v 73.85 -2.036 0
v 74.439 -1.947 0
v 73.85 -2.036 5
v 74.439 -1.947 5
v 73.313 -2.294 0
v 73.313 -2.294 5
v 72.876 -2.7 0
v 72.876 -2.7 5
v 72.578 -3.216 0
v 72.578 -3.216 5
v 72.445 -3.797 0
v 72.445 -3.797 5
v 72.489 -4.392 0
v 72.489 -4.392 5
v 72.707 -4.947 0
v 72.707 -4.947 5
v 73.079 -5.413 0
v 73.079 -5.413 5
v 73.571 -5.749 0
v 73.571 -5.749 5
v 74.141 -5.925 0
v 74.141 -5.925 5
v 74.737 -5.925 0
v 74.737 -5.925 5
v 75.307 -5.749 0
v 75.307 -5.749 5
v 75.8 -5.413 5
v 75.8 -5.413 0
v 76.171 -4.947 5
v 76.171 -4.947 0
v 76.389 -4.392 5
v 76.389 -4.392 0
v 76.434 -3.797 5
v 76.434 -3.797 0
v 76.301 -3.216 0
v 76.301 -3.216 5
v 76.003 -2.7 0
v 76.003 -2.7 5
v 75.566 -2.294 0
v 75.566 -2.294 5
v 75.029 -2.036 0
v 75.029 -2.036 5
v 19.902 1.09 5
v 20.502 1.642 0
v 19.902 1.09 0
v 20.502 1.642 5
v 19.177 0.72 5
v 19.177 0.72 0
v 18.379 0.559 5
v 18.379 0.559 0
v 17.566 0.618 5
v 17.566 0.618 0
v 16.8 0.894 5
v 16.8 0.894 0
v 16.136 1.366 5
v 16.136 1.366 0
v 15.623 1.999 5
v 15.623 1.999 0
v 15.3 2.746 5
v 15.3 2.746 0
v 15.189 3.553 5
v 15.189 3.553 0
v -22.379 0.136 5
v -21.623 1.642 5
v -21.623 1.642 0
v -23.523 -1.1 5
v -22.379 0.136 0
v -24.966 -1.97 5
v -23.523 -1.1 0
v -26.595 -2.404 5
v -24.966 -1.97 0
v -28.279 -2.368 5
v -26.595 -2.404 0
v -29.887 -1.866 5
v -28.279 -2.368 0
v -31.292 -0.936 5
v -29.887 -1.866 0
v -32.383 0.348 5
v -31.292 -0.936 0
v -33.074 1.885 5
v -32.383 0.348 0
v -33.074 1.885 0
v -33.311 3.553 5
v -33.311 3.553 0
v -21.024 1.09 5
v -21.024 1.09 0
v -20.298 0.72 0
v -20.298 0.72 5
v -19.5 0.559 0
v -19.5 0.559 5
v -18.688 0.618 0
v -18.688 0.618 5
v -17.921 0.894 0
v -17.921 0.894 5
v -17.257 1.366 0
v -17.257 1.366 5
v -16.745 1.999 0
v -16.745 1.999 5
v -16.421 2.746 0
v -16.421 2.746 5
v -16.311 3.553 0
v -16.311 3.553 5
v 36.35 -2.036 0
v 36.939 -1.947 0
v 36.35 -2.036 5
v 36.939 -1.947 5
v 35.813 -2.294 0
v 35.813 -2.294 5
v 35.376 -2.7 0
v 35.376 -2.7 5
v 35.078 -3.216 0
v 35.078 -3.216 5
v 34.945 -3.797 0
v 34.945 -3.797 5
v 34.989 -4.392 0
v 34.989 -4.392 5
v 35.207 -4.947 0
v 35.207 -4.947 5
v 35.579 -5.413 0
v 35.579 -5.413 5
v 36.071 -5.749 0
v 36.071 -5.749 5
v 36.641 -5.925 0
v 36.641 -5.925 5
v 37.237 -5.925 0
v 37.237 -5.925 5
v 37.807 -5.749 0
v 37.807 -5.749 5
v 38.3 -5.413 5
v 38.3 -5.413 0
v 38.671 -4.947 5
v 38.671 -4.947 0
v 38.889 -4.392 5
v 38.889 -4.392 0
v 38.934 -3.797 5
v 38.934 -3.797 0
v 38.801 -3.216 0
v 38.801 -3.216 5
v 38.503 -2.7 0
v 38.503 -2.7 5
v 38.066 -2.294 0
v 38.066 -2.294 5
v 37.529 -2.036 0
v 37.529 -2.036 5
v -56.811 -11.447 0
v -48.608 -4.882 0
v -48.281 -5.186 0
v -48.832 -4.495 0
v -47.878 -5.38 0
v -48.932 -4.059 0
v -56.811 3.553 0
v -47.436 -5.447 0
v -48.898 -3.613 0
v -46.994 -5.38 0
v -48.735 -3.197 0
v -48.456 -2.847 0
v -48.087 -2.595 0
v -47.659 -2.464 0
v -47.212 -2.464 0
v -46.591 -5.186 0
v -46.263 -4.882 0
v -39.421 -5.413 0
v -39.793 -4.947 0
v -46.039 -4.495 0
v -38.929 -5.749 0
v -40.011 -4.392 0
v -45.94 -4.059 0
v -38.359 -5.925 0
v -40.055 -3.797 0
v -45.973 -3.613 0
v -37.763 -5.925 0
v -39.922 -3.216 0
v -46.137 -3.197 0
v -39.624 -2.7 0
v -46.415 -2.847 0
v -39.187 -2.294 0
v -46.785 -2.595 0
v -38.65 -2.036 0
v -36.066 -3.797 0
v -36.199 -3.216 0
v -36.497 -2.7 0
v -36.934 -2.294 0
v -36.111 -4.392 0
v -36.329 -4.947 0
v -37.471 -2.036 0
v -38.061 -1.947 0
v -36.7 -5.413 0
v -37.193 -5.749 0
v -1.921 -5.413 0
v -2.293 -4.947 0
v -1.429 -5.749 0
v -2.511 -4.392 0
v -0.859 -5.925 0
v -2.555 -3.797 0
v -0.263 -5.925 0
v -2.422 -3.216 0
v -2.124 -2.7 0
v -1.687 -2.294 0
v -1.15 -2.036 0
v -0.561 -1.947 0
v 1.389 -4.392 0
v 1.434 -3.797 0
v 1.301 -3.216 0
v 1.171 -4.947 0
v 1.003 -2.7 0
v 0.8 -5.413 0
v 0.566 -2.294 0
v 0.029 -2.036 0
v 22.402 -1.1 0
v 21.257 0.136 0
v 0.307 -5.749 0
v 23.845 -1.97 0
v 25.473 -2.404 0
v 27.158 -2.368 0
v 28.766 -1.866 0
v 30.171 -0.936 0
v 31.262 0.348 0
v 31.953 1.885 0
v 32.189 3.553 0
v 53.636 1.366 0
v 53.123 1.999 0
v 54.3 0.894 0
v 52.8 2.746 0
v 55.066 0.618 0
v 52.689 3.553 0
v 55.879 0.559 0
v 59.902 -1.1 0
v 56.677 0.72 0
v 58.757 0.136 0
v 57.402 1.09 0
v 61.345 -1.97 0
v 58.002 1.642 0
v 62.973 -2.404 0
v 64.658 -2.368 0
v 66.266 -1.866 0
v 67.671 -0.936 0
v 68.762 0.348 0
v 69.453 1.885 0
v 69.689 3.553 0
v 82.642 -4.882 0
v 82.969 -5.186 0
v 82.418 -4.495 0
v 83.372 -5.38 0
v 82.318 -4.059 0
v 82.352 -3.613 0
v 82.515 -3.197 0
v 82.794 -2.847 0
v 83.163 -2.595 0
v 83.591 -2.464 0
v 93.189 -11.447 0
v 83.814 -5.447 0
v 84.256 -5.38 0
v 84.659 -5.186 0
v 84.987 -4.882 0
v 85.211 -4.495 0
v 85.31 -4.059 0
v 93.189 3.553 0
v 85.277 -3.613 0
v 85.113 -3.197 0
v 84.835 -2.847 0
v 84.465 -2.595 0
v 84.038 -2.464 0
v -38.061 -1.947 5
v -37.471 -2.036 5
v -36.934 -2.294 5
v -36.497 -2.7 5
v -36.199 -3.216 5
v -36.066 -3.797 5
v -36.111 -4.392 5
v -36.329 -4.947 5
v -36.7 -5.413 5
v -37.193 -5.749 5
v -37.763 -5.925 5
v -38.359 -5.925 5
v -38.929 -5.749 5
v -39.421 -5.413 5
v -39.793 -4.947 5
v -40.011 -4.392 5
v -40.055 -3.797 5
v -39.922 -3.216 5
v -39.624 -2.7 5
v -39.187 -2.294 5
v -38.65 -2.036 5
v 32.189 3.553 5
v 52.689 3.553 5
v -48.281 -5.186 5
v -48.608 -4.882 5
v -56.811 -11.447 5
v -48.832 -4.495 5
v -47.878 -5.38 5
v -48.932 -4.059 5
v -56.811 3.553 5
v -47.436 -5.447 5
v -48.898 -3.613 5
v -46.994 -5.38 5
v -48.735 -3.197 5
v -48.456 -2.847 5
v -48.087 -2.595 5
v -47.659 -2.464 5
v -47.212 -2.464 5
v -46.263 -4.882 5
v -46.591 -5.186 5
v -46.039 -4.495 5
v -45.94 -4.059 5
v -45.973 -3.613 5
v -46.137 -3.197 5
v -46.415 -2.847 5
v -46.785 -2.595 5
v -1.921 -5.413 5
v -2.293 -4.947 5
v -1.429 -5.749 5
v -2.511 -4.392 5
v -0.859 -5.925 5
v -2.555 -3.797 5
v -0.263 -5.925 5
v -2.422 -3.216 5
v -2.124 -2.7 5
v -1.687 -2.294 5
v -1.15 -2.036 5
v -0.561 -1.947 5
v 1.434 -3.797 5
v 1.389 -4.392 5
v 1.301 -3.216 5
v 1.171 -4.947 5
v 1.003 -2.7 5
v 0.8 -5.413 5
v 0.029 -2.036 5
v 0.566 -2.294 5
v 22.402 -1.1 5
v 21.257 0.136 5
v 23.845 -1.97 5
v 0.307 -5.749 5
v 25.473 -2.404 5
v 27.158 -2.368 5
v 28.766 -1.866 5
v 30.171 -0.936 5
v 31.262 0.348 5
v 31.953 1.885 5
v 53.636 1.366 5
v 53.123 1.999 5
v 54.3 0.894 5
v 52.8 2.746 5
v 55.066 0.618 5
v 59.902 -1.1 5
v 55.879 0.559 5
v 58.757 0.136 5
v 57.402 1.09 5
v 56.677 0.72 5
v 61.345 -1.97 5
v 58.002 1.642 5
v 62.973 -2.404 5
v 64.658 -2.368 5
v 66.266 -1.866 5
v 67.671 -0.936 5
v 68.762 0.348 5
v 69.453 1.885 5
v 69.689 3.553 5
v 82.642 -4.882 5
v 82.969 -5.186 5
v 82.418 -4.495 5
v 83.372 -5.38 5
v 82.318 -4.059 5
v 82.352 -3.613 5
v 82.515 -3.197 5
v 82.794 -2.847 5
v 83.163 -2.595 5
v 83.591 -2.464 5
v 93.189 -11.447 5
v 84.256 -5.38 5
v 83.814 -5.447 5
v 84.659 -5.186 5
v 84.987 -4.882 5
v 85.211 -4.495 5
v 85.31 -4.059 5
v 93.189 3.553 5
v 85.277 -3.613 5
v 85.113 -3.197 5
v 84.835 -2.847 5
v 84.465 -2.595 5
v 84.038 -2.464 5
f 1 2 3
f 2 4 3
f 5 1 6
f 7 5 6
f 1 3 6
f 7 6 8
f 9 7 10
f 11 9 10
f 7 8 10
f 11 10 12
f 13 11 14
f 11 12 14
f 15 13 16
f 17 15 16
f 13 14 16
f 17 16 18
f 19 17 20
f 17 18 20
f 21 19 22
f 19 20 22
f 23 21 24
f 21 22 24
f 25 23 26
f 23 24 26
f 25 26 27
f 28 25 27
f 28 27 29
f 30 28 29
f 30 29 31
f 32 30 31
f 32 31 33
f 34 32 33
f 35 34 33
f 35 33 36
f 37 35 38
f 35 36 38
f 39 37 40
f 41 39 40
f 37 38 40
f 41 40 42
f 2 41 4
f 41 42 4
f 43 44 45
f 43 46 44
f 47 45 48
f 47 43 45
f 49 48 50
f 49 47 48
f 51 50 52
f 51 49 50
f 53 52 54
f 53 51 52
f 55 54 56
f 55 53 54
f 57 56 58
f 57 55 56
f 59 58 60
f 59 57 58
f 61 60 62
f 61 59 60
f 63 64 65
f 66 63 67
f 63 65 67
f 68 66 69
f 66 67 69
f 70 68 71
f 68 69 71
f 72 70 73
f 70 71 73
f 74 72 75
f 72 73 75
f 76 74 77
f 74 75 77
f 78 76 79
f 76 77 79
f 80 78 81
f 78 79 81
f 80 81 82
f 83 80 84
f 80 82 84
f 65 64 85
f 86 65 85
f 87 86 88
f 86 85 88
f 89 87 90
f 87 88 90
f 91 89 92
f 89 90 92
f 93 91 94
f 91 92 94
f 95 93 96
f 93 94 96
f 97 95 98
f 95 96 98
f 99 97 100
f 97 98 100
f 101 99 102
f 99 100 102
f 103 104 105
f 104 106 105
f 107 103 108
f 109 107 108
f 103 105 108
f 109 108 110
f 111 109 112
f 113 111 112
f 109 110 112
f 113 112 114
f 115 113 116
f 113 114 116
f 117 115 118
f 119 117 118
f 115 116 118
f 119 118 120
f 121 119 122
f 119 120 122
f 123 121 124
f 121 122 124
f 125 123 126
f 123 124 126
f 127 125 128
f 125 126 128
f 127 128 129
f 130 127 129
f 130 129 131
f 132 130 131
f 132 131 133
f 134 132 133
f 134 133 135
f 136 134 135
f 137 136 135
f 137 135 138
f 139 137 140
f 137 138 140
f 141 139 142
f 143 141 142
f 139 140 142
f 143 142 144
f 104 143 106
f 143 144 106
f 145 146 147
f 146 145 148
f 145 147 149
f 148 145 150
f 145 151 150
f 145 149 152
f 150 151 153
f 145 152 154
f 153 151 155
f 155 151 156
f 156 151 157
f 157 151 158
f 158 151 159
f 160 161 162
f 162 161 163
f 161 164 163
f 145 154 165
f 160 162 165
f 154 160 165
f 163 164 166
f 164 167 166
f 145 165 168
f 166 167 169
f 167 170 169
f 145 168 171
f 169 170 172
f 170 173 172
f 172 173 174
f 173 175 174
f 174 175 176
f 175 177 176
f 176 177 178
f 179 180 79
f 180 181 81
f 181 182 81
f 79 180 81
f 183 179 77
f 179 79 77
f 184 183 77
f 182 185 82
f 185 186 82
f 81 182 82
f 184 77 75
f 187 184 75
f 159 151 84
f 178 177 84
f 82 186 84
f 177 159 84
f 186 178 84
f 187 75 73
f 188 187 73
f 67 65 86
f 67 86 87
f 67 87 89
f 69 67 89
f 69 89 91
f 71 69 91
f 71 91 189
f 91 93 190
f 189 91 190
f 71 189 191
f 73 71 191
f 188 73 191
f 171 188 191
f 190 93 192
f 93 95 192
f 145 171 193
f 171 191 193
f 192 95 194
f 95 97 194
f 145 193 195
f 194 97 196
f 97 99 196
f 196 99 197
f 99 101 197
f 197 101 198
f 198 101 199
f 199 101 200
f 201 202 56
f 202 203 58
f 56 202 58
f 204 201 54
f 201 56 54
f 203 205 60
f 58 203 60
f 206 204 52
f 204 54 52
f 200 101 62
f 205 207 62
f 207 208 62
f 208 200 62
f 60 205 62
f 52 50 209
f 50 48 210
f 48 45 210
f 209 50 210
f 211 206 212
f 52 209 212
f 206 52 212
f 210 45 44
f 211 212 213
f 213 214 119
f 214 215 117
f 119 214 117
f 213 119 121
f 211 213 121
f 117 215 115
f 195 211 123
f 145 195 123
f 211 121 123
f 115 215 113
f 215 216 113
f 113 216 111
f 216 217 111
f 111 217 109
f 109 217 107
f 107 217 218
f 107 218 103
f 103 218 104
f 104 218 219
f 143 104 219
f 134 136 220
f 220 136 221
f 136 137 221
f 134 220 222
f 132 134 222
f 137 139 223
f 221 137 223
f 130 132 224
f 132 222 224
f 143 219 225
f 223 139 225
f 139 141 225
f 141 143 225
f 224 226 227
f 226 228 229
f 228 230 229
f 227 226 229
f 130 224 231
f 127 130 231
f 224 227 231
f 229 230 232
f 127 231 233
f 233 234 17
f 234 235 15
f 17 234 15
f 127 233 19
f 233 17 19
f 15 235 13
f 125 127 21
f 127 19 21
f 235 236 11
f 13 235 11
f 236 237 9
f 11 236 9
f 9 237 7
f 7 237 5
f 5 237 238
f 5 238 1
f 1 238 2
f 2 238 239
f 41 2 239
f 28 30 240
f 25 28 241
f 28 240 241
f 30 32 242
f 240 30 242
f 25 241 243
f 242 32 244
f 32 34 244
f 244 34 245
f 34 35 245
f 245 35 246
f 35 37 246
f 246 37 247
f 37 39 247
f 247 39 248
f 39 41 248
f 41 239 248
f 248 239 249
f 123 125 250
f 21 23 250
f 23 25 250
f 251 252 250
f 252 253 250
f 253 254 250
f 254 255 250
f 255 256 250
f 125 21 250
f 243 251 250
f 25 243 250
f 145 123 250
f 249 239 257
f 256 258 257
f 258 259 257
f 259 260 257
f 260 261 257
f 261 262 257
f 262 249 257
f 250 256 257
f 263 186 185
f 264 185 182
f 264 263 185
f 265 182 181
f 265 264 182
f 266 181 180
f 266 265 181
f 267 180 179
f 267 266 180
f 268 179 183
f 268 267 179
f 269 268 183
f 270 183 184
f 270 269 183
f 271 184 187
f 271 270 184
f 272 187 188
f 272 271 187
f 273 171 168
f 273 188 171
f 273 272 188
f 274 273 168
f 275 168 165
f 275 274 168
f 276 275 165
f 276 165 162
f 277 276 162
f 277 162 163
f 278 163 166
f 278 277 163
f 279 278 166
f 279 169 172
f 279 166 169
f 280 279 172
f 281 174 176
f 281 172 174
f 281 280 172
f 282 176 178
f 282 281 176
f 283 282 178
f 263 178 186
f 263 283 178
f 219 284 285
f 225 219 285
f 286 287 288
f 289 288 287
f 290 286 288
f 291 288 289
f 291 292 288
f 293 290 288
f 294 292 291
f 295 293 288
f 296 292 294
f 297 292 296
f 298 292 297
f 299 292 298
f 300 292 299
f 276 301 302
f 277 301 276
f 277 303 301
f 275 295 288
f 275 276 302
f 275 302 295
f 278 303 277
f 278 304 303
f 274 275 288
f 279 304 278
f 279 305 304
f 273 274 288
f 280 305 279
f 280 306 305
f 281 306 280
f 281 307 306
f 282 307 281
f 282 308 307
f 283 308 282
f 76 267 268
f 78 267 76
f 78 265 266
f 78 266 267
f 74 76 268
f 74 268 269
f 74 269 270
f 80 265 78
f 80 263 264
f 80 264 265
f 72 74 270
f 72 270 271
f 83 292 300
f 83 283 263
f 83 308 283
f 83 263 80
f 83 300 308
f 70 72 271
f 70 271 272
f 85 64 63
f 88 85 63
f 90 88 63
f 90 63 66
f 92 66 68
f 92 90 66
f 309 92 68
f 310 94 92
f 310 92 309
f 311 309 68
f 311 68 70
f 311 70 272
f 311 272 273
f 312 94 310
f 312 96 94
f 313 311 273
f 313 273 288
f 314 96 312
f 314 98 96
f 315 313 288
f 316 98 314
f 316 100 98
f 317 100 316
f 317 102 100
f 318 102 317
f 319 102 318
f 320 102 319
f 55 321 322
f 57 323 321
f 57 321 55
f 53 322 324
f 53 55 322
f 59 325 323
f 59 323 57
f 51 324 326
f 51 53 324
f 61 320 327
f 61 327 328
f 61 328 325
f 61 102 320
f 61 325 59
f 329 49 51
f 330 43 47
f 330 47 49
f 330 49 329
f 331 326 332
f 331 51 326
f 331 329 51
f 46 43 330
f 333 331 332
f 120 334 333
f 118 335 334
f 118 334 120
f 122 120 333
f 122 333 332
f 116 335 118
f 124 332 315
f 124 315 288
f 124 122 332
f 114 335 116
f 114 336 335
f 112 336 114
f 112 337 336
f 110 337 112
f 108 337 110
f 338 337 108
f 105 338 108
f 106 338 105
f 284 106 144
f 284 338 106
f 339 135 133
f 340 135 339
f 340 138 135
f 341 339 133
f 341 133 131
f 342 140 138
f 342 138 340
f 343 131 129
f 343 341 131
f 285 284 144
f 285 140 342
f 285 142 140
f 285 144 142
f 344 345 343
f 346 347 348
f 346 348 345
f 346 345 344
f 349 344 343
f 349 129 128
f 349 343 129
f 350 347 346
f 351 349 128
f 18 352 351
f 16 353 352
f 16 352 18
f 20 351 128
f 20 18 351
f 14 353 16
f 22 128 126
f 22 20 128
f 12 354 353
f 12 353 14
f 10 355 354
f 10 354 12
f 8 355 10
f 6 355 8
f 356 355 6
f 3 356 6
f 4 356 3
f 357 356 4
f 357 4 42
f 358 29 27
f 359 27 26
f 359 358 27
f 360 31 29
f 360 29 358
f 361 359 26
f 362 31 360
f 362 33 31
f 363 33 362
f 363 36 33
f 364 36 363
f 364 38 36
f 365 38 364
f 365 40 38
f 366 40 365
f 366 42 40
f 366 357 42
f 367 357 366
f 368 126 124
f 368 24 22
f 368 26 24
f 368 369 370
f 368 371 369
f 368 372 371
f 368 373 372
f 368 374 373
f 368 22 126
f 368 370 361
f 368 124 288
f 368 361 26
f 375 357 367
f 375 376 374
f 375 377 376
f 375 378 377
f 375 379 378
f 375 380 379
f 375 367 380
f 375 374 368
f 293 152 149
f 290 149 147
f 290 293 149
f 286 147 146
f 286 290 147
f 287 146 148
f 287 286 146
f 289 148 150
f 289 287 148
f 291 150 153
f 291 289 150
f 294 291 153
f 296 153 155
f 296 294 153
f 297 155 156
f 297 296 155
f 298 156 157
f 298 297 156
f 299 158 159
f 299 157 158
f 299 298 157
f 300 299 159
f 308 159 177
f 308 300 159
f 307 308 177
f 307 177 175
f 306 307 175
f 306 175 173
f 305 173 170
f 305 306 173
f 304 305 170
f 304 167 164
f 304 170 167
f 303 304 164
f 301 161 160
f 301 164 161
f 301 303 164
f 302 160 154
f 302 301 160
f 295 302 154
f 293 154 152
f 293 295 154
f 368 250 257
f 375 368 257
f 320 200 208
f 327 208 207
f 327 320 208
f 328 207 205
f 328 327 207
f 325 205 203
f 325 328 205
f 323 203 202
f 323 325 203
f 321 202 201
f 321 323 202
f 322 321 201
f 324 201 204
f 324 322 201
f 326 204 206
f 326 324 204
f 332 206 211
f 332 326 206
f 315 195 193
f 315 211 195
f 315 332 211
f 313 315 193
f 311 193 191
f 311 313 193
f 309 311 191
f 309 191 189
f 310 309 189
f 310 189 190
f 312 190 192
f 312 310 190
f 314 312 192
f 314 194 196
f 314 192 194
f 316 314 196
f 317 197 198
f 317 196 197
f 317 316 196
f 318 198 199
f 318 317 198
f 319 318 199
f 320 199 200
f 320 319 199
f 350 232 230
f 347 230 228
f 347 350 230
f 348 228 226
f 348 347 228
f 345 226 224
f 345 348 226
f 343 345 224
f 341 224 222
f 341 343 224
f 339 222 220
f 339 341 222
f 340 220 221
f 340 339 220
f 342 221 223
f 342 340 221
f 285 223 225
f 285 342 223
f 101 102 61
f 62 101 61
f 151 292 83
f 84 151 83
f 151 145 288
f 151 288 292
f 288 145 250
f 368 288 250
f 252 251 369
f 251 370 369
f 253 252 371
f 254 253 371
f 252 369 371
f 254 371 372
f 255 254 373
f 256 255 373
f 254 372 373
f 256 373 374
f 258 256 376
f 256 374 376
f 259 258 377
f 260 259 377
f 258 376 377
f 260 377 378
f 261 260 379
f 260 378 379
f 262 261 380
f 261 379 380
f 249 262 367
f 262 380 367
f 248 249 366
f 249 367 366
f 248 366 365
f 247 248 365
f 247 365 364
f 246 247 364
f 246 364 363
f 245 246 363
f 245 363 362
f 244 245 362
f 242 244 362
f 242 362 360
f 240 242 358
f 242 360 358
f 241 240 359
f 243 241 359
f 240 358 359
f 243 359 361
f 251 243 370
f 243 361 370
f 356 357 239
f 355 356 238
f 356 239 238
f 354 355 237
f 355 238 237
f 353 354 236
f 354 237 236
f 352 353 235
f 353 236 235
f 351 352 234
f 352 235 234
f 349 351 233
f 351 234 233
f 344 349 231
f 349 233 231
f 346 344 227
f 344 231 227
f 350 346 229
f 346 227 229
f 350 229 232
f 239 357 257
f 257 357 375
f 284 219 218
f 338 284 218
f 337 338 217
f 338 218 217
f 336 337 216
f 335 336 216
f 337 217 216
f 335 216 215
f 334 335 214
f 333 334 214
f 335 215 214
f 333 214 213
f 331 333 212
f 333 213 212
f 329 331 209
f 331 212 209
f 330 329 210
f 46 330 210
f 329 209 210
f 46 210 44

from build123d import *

# Parameters (mm, degrees)
SKETCH1_W                      = 150
SKETCH1_H                      = 30
BOSS_EXTRUDE1_DEPTH            = 5
F_6_0MM_DOWEL_HOLE1_AT_2_COUNT = 2
F_6_0MM_DOWEL_HOLE1_AT_2_PITCH = 37.5
F_4_0MM_DOWEL_HOLE1_AT_2_COUNT = 2
F_4_0MM_DOWEL_HOLE1_AT_2_PITCH = 37.5
F_12_0MM_DOWEL_HOLE2_D         = 12
F_12_0MM_DOWEL_HOLE2_DEPTH     = 25
F_12_0MM_DOWEL_HOLE2_TIP       = 3.605163714
SKETCH30_W                     = 150
SKETCH30_H                     = 15
CUT_EXTRUDE1_DEPTH             = 10
F_12_0MM_DOWEL_HOLE3_D         = 12
F_12_0MM_DOWEL_HOLE3_DEPTH     = 12.75
F_12_0MM_DOWEL_HOLE3_TIP       = 3.605163714


with BuildPart() as part:
    # Sketch1 → Boss-Extrude1 (new body)
    with BuildSketch(Plane.XY):
        with Locations((18.189254194, 3.553058878)):
            Rectangle(SKETCH1_W, SKETCH1_H)
    extrude(amount=BOSS_EXTRUDE1_DEPTH)

    # Sketch4 → Ø6.0mm Dowel Hole1 (revolve, cut)
    with BuildSketch(Plane(origin=(55.689254194, 3.553058878, 5), x_dir=(0, -1, 0), z_dir=(1, 0, 0))):
        Polygon((0, 0), (0, 26.802581857), (3, 25), (3, 0), align=None)
    f_6_0mm_dowel_hole1 = revolve(axis=Axis((55.689254194, 3.553058878, 11.35), (0, 0, -1)), mode=Mode.SUBTRACT)

    # Ø6.0mm Dowel Hole1 at 2: Ø6.0mm Dowel Hole1 ×2
    with Locations(*[(-i * F_6_0MM_DOWEL_HOLE1_AT_2_PITCH, 0, 0) for i in range(1, F_6_0MM_DOWEL_HOLE1_AT_2_COUNT)]):
        add(f_6_0mm_dowel_hole1, mode=Mode.SUBTRACT)

    # Mirror1: Ø6.0mm Dowel Hole1 across plane
    add(f_6_0mm_dowel_hole1.mirror(Plane.ZY.offset(-18.189254194)), mode=Mode.SUBTRACT)

    # Mirror1 copy 1 sketch → Mirror1 copy 1 (revolve, cut)
    with BuildSketch(Plane(origin=(18.189254194, 3.553058878, 5), x_dir=(0, -1, 0), z_dir=(-1, 0, 0))):
        Polygon((0, 0), (0, -26.802581857), (3, -25), (3, 0), align=None)
    revolve(axis=Axis((18.189254194, 3.553058878, 11.35), (0, 0, 1)), mode=Mode.SUBTRACT)

    # Sketch6 → Ø4.0mm Dowel Hole1 (revolve, cut)
    with BuildSketch(Plane(origin=(74.439254194, 11.053058878, 5), x_dir=(0, -1, 0), z_dir=(1, 0, 0))):
        Polygon((0, 0), (0, 26.201721238), (2, 25), (2, 0), align=None)
    f_4_0mm_dowel_hole1 = revolve(axis=Axis((74.439254194, 11.053058878, 11.35), (0, 0, -1)), mode=Mode.SUBTRACT)

    # Ø4.0mm Dowel Hole1 at 2: Ø4.0mm Dowel Hole1 ×2
    with Locations(*[(-i * F_4_0MM_DOWEL_HOLE1_AT_2_PITCH, 0, 0) for i in range(1, F_4_0MM_DOWEL_HOLE1_AT_2_COUNT)]):
        add(f_4_0mm_dowel_hole1, mode=Mode.SUBTRACT)

    # Mirror2: Ø4.0mm Dowel Hole1 across plane
    add(f_4_0mm_dowel_hole1.mirror(Plane.ZX.offset(3.553058878)), mode=Mode.SUBTRACT)

    # Mirror2 copy 1 sketch → Mirror2 copy 1 (revolve, cut)
    with BuildSketch(Plane(origin=(36.939254194, -3.946941122, 5), x_dir=(0, 1, 0), z_dir=(1, 0, 0))):
        Polygon((0, 0), (0, -26.201721238), (2, -25), (2, 0), align=None)
    revolve(axis=Axis((36.939254194, -3.946941122, 11.35), (0, 0, 1)), mode=Mode.SUBTRACT)

    # Mirror3: Ø4.0mm Dowel Hole1 across plane
    add(f_4_0mm_dowel_hole1.mirror(Plane.ZY.offset(-18.189254194)), mode=Mode.SUBTRACT)

    # Mirror3 copy 1 sketch → Mirror3 copy 1 (revolve, cut)
    with BuildSketch(Plane(origin=(-38.060745806, -3.946941122, 5), x_dir=(0, 1, 0), z_dir=(-1, 0, 0))):
        Polygon((0, 0), (0, 26.201721238), (2, 25), (2, 0), align=None)
    revolve(axis=Axis((-38.060745806, -3.946941122, 11.35), (0, 0, -1)), mode=Mode.SUBTRACT)

    # Mirror3 copy 2 sketch → Mirror3 copy 2 (revolve, cut)
    with BuildSketch(Plane(origin=(-0.560745806, -3.946941122, 5), x_dir=(0, 1, 0), z_dir=(-1, 0, 0))):
        Polygon((0, 0), (0, 26.201721238), (2, 25), (2, 0), align=None)
    revolve(axis=Axis((-0.560745806, -3.946941122, 11.35), (0, 0, -1)), mode=Mode.SUBTRACT)

    # Mirror3 copy 3 sketch → Mirror3 copy 3 (revolve, cut)
    with BuildSketch(Plane(origin=(-0.560745806, 11.053058878, 5), x_dir=(0, -1, 0), z_dir=(-1, 0, 0))):
        Polygon((0, 0), (0, -26.201721238), (2, -25), (2, 0), align=None)
    revolve(axis=Axis((-0.560745806, 11.053058878, 11.35), (0, 0, 1)), mode=Mode.SUBTRACT)

    # Sketch23 → Ø3.0mm Dowel Hole2 (revolve, cut)
    with BuildSketch(Plane(origin=(-47.435745806, -3.946941122, 5), x_dir=(0, -1, 0), z_dir=(1, 0, 0))):
        Polygon((0, 0), (0, 25.901290929), (1.5, 25), (1.5, 0), align=None)
    f_3_0mm_dowel_hole2 = revolve(axis=Axis((-47.435745806, -3.946941122, 11.35), (0, 0, -1)), mode=Mode.SUBTRACT)

    # Mirror5: Ø3.0mm Dowel Hole2 across plane
    add(f_3_0mm_dowel_hole2.mirror(Plane.ZY.offset(-18.189254194)), mode=Mode.SUBTRACT)

    # Ø12.0mm Dowel Hole2
    with Locations(Plane(origin=(26.189254194, 3.553058878, 5), x_dir=(1, 0, 0), z_dir=(0, 0, 1))):
        with Locations((0, 0)):
            Hole(F_12_0MM_DOWEL_HOLE2_D / 2, depth=F_12_0MM_DOWEL_HOLE2_DEPTH)
            with Locations((0, 0, -(F_12_0MM_DOWEL_HOLE2_DEPTH + F_12_0MM_DOWEL_HOLE2_TIP / 2))):  # 118° drill point
                Cone(0, F_12_0MM_DOWEL_HOLE2_D / 2, F_12_0MM_DOWEL_HOLE2_TIP, mode=Mode.SUBTRACT)

    # Sketch30 → Cut-Extrude1 (cut)
    with BuildSketch(Plane.XY.offset(5)):
        with Locations((18.189254194, 11.053058878)):
            Rectangle(SKETCH30_W, SKETCH30_H)
    extrude(amount=-CUT_EXTRUDE1_DEPTH, mode=Mode.SUBTRACT)

    # Ø12.0mm Dowel Hole3
    with Locations(Plane.XY.offset(5)):
        with Locations((63.689254194, 3.553058878), (-27.310745806, 3.553058878)):
            Hole(F_12_0MM_DOWEL_HOLE3_D / 2, depth=F_12_0MM_DOWEL_HOLE3_DEPTH)
            with Locations((0, 0, -(F_12_0MM_DOWEL_HOLE3_DEPTH + F_12_0MM_DOWEL_HOLE3_TIP / 2))):  # 118° drill point
                Cone(0, F_12_0MM_DOWEL_HOLE3_D / 2, F_12_0MM_DOWEL_HOLE3_TIP, mode=Mode.SUBTRACT)


solid = part.part
